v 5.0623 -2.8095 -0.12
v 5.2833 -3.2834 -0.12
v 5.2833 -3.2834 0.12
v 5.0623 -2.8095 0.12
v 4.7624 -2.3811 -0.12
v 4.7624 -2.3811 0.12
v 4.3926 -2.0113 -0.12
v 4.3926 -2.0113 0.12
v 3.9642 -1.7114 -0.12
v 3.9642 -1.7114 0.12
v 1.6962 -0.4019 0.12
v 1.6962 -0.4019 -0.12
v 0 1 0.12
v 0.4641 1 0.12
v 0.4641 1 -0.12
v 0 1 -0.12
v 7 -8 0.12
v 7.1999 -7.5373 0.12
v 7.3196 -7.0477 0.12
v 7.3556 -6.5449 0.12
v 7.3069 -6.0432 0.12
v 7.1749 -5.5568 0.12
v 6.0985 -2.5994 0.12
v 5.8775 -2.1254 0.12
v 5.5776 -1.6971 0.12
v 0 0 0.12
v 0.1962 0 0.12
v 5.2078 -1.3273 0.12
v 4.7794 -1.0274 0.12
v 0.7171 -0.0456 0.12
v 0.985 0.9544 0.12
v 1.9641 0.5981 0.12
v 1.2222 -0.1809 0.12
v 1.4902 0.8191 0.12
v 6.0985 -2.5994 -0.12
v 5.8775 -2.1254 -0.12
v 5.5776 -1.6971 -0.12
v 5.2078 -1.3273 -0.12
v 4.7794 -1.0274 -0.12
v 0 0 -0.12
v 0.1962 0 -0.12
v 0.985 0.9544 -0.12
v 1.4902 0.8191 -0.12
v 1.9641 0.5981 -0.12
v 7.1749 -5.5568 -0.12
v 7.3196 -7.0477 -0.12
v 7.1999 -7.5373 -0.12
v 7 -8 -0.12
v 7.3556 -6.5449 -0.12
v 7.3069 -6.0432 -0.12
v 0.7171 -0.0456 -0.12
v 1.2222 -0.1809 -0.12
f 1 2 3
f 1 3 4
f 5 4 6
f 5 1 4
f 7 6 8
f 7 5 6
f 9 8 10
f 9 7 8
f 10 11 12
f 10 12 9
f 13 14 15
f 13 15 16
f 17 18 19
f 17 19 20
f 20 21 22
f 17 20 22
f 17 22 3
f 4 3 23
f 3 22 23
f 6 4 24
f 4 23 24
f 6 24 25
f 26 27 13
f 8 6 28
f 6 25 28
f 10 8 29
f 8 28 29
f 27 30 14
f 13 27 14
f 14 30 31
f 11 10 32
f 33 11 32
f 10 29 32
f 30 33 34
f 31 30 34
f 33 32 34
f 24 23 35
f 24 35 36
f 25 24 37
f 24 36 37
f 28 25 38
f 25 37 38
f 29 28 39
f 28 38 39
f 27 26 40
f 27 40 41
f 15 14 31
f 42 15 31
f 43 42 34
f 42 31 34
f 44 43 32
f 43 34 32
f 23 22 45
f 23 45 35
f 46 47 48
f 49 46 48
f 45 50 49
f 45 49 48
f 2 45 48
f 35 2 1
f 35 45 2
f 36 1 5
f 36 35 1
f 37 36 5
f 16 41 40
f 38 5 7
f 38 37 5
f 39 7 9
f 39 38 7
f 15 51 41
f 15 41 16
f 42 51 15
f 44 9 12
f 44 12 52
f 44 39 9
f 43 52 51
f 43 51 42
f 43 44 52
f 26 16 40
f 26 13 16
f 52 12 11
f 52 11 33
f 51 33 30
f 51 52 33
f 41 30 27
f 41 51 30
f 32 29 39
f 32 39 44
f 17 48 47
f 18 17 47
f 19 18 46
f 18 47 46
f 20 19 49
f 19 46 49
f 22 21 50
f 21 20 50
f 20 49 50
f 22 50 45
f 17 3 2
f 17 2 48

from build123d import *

# Parameters (mm, degrees)
BOSS_EXTRUDE1_DEPTH = 0.12
FILLET1_R           = 3


with BuildPart() as part:
    # Sketch1 → Boss-Extrude1 (new, symmetric)
    with BuildSketch(Plane.XY):
        Polygon((0, 0), (1, 0), (4.909846718, -2.257351055), (7, -8), (7.652703645, -6.869484125), (5.725054187, -1.573310769), (1.267949192, 1), (0, 1), align=None)
    extrude(amount=BOSS_EXTRUDE1_DEPTH, both=True)

    # Fillet1
    # the kernel refuses this fillet: 3 mm, written as the material it adds along each edge
    with BuildSketch(Plane(origin=(1, 0, -0.12), x_dir=(-1, 0, 0), z_dir=(0, 0, 1))) as fillet1_piece_1:
        with BuildLine():
            CenterArc((FILLET1_R * 0.267949192431, FILLET1_R), FILLET1_R, 240, 30)
            Line((-FILLET1_R * 0.232050807569, FILLET1_R * 0.133974596216), (-FILLET1_R * 0.242050807569, FILLET1_R * 0.11665408814))
            Line((-FILLET1_R * 0.242050807569, FILLET1_R * 0.11665408814), (-FILLET1_R * 0.00535898384862, -FILLET1_R * 0.02))
            Line((-FILLET1_R * 0.00535898384862, -FILLET1_R * 0.02), (FILLET1_R * 0.267949192431, -FILLET1_R * 0.02))
            Line((FILLET1_R * 0.267949192431, -FILLET1_R * 0.02), (FILLET1_R * 0.267949192431, 0))
        make_face()
    extrude(amount=0.24)
    # the kernel refuses this fillet: 3 mm, written as the material it adds along each edge
    with BuildSketch(Plane(origin=(4.909846718, -2.257351055, -0.12), x_dir=(0.34202014332566544, -0.9396926207859095, 0), z_dir=(0, 0, 1))) as fillet1_2_piece_1:
        with BuildLine():
            CenterArc((FILLET1_R * 0.363970234266, -FILLET1_R), FILLET1_R, 90, 40)
            Line((-FILLET1_R * 0.27881737542, -FILLET1_R * 0.233955556881), (-FILLET1_R * 0.291673127614, -FILLET1_R * 0.218634668019))
            Line((-FILLET1_R * 0.291673127614, -FILLET1_R * 0.218634668019), (-FILLET1_R * 0.00727940468532, FILLET1_R * 0.02))
            Line((-FILLET1_R * 0.00727940468532, FILLET1_R * 0.02), (FILLET1_R * 0.363970234266, FILLET1_R * 0.02))
            Line((FILLET1_R * 0.363970234266, FILLET1_R * 0.02), (FILLET1_R * 0.363970234266, 0))
        make_face()
    extrude(amount=0.24)
    # the kernel refuses this fillet: 3 mm, written as the material it takes off along each edge
    with BuildSketch(Plane(origin=(1.267949192, 1, 2.129618943), x_dir=(-1, 0, 0), z_dir=(0, 0, -1))) as fillet1_3_piece_1:
        with BuildLine():
            CenterArc((FILLET1_R * 0.267949192431, -FILLET1_R), FILLET1_R, 90, 30)
            Line((-FILLET1_R * 0.232050807569, -FILLET1_R * 0.133974596216), (-FILLET1_R * 0.242050807569, -FILLET1_R * 0.11665408814))
            Line((-FILLET1_R * 0.242050807569, -FILLET1_R * 0.11665408814), (-FILLET1_R * 0.00535898384862, FILLET1_R * 0.02))
            Line((-FILLET1_R * 0.00535898384862, FILLET1_R * 0.02), (FILLET1_R * 0.267949192431, FILLET1_R * 0.02))
            Line((FILLET1_R * 0.267949192431, FILLET1_R * 0.02), (FILLET1_R * 0.267949192431, 0))
        make_face()
    extrude(amount=4.259237886, mode=Mode.SUBTRACT)
    # the kernel refuses this fillet: 3 mm, written as the material it takes off along each edge
    with BuildSketch(Plane(origin=(5.725054187, -1.573310769, -2.849776757), x_dir=(-0.8660254037844383, 0.5000000000000006, 0), z_dir=(0, 0, 1))) as fillet1_4_piece_1:
        with BuildLine():
            CenterArc((FILLET1_R * 0.363970234266, FILLET1_R), FILLET1_R, 230, 40)
            Line((-FILLET1_R * 0.27881737542, FILLET1_R * 0.233955556881), (-FILLET1_R * 0.291673127614, FILLET1_R * 0.218634668019))
            Line((-FILLET1_R * 0.291673127614, FILLET1_R * 0.218634668019), (-FILLET1_R * 0.00727940468532, -FILLET1_R * 0.02))
            Line((-FILLET1_R * 0.00727940468532, -FILLET1_R * 0.02), (FILLET1_R * 0.363970234266, -FILLET1_R * 0.02))
            Line((FILLET1_R * 0.363970234266, -FILLET1_R * 0.02), (FILLET1_R * 0.363970234266, 0))
        make_face()
    extrude(amount=5.699553514, mode=Mode.SUBTRACT)
    # the kernel refuses this fillet: 3 mm, written as the material it takes off along each edge
    with BuildSketch(Plane(origin=(7.652703645, -6.869484125, -3.612420866), x_dir=(-0.34202014332566655, 0.9396926207859092, 0), z_dir=(0, 0, 1))) as fillet1_5_piece_1:
        with BuildLine():
            CenterArc((1.396968346, 3), FILLET1_R, 221.810314896, 48.189685104)
            Line((-0.839099631, 1), (-0.883820991, 0.96))
            ThreePointArc((-0.883820991, 0.96), (-0.465512482, 0.461432743), (-0.045962667, -0.038567257))
            Line((-0.045962667, -0.038567257), (0, -0.06))
            Line((0, -0.06), (1.396968346, -0.06))
            Line((1.396968346, -0.06), (1.396968346, 0))
        make_face()
    extrude(amount=7.224841732, mode=Mode.SUBTRACT)


solid = part.part
